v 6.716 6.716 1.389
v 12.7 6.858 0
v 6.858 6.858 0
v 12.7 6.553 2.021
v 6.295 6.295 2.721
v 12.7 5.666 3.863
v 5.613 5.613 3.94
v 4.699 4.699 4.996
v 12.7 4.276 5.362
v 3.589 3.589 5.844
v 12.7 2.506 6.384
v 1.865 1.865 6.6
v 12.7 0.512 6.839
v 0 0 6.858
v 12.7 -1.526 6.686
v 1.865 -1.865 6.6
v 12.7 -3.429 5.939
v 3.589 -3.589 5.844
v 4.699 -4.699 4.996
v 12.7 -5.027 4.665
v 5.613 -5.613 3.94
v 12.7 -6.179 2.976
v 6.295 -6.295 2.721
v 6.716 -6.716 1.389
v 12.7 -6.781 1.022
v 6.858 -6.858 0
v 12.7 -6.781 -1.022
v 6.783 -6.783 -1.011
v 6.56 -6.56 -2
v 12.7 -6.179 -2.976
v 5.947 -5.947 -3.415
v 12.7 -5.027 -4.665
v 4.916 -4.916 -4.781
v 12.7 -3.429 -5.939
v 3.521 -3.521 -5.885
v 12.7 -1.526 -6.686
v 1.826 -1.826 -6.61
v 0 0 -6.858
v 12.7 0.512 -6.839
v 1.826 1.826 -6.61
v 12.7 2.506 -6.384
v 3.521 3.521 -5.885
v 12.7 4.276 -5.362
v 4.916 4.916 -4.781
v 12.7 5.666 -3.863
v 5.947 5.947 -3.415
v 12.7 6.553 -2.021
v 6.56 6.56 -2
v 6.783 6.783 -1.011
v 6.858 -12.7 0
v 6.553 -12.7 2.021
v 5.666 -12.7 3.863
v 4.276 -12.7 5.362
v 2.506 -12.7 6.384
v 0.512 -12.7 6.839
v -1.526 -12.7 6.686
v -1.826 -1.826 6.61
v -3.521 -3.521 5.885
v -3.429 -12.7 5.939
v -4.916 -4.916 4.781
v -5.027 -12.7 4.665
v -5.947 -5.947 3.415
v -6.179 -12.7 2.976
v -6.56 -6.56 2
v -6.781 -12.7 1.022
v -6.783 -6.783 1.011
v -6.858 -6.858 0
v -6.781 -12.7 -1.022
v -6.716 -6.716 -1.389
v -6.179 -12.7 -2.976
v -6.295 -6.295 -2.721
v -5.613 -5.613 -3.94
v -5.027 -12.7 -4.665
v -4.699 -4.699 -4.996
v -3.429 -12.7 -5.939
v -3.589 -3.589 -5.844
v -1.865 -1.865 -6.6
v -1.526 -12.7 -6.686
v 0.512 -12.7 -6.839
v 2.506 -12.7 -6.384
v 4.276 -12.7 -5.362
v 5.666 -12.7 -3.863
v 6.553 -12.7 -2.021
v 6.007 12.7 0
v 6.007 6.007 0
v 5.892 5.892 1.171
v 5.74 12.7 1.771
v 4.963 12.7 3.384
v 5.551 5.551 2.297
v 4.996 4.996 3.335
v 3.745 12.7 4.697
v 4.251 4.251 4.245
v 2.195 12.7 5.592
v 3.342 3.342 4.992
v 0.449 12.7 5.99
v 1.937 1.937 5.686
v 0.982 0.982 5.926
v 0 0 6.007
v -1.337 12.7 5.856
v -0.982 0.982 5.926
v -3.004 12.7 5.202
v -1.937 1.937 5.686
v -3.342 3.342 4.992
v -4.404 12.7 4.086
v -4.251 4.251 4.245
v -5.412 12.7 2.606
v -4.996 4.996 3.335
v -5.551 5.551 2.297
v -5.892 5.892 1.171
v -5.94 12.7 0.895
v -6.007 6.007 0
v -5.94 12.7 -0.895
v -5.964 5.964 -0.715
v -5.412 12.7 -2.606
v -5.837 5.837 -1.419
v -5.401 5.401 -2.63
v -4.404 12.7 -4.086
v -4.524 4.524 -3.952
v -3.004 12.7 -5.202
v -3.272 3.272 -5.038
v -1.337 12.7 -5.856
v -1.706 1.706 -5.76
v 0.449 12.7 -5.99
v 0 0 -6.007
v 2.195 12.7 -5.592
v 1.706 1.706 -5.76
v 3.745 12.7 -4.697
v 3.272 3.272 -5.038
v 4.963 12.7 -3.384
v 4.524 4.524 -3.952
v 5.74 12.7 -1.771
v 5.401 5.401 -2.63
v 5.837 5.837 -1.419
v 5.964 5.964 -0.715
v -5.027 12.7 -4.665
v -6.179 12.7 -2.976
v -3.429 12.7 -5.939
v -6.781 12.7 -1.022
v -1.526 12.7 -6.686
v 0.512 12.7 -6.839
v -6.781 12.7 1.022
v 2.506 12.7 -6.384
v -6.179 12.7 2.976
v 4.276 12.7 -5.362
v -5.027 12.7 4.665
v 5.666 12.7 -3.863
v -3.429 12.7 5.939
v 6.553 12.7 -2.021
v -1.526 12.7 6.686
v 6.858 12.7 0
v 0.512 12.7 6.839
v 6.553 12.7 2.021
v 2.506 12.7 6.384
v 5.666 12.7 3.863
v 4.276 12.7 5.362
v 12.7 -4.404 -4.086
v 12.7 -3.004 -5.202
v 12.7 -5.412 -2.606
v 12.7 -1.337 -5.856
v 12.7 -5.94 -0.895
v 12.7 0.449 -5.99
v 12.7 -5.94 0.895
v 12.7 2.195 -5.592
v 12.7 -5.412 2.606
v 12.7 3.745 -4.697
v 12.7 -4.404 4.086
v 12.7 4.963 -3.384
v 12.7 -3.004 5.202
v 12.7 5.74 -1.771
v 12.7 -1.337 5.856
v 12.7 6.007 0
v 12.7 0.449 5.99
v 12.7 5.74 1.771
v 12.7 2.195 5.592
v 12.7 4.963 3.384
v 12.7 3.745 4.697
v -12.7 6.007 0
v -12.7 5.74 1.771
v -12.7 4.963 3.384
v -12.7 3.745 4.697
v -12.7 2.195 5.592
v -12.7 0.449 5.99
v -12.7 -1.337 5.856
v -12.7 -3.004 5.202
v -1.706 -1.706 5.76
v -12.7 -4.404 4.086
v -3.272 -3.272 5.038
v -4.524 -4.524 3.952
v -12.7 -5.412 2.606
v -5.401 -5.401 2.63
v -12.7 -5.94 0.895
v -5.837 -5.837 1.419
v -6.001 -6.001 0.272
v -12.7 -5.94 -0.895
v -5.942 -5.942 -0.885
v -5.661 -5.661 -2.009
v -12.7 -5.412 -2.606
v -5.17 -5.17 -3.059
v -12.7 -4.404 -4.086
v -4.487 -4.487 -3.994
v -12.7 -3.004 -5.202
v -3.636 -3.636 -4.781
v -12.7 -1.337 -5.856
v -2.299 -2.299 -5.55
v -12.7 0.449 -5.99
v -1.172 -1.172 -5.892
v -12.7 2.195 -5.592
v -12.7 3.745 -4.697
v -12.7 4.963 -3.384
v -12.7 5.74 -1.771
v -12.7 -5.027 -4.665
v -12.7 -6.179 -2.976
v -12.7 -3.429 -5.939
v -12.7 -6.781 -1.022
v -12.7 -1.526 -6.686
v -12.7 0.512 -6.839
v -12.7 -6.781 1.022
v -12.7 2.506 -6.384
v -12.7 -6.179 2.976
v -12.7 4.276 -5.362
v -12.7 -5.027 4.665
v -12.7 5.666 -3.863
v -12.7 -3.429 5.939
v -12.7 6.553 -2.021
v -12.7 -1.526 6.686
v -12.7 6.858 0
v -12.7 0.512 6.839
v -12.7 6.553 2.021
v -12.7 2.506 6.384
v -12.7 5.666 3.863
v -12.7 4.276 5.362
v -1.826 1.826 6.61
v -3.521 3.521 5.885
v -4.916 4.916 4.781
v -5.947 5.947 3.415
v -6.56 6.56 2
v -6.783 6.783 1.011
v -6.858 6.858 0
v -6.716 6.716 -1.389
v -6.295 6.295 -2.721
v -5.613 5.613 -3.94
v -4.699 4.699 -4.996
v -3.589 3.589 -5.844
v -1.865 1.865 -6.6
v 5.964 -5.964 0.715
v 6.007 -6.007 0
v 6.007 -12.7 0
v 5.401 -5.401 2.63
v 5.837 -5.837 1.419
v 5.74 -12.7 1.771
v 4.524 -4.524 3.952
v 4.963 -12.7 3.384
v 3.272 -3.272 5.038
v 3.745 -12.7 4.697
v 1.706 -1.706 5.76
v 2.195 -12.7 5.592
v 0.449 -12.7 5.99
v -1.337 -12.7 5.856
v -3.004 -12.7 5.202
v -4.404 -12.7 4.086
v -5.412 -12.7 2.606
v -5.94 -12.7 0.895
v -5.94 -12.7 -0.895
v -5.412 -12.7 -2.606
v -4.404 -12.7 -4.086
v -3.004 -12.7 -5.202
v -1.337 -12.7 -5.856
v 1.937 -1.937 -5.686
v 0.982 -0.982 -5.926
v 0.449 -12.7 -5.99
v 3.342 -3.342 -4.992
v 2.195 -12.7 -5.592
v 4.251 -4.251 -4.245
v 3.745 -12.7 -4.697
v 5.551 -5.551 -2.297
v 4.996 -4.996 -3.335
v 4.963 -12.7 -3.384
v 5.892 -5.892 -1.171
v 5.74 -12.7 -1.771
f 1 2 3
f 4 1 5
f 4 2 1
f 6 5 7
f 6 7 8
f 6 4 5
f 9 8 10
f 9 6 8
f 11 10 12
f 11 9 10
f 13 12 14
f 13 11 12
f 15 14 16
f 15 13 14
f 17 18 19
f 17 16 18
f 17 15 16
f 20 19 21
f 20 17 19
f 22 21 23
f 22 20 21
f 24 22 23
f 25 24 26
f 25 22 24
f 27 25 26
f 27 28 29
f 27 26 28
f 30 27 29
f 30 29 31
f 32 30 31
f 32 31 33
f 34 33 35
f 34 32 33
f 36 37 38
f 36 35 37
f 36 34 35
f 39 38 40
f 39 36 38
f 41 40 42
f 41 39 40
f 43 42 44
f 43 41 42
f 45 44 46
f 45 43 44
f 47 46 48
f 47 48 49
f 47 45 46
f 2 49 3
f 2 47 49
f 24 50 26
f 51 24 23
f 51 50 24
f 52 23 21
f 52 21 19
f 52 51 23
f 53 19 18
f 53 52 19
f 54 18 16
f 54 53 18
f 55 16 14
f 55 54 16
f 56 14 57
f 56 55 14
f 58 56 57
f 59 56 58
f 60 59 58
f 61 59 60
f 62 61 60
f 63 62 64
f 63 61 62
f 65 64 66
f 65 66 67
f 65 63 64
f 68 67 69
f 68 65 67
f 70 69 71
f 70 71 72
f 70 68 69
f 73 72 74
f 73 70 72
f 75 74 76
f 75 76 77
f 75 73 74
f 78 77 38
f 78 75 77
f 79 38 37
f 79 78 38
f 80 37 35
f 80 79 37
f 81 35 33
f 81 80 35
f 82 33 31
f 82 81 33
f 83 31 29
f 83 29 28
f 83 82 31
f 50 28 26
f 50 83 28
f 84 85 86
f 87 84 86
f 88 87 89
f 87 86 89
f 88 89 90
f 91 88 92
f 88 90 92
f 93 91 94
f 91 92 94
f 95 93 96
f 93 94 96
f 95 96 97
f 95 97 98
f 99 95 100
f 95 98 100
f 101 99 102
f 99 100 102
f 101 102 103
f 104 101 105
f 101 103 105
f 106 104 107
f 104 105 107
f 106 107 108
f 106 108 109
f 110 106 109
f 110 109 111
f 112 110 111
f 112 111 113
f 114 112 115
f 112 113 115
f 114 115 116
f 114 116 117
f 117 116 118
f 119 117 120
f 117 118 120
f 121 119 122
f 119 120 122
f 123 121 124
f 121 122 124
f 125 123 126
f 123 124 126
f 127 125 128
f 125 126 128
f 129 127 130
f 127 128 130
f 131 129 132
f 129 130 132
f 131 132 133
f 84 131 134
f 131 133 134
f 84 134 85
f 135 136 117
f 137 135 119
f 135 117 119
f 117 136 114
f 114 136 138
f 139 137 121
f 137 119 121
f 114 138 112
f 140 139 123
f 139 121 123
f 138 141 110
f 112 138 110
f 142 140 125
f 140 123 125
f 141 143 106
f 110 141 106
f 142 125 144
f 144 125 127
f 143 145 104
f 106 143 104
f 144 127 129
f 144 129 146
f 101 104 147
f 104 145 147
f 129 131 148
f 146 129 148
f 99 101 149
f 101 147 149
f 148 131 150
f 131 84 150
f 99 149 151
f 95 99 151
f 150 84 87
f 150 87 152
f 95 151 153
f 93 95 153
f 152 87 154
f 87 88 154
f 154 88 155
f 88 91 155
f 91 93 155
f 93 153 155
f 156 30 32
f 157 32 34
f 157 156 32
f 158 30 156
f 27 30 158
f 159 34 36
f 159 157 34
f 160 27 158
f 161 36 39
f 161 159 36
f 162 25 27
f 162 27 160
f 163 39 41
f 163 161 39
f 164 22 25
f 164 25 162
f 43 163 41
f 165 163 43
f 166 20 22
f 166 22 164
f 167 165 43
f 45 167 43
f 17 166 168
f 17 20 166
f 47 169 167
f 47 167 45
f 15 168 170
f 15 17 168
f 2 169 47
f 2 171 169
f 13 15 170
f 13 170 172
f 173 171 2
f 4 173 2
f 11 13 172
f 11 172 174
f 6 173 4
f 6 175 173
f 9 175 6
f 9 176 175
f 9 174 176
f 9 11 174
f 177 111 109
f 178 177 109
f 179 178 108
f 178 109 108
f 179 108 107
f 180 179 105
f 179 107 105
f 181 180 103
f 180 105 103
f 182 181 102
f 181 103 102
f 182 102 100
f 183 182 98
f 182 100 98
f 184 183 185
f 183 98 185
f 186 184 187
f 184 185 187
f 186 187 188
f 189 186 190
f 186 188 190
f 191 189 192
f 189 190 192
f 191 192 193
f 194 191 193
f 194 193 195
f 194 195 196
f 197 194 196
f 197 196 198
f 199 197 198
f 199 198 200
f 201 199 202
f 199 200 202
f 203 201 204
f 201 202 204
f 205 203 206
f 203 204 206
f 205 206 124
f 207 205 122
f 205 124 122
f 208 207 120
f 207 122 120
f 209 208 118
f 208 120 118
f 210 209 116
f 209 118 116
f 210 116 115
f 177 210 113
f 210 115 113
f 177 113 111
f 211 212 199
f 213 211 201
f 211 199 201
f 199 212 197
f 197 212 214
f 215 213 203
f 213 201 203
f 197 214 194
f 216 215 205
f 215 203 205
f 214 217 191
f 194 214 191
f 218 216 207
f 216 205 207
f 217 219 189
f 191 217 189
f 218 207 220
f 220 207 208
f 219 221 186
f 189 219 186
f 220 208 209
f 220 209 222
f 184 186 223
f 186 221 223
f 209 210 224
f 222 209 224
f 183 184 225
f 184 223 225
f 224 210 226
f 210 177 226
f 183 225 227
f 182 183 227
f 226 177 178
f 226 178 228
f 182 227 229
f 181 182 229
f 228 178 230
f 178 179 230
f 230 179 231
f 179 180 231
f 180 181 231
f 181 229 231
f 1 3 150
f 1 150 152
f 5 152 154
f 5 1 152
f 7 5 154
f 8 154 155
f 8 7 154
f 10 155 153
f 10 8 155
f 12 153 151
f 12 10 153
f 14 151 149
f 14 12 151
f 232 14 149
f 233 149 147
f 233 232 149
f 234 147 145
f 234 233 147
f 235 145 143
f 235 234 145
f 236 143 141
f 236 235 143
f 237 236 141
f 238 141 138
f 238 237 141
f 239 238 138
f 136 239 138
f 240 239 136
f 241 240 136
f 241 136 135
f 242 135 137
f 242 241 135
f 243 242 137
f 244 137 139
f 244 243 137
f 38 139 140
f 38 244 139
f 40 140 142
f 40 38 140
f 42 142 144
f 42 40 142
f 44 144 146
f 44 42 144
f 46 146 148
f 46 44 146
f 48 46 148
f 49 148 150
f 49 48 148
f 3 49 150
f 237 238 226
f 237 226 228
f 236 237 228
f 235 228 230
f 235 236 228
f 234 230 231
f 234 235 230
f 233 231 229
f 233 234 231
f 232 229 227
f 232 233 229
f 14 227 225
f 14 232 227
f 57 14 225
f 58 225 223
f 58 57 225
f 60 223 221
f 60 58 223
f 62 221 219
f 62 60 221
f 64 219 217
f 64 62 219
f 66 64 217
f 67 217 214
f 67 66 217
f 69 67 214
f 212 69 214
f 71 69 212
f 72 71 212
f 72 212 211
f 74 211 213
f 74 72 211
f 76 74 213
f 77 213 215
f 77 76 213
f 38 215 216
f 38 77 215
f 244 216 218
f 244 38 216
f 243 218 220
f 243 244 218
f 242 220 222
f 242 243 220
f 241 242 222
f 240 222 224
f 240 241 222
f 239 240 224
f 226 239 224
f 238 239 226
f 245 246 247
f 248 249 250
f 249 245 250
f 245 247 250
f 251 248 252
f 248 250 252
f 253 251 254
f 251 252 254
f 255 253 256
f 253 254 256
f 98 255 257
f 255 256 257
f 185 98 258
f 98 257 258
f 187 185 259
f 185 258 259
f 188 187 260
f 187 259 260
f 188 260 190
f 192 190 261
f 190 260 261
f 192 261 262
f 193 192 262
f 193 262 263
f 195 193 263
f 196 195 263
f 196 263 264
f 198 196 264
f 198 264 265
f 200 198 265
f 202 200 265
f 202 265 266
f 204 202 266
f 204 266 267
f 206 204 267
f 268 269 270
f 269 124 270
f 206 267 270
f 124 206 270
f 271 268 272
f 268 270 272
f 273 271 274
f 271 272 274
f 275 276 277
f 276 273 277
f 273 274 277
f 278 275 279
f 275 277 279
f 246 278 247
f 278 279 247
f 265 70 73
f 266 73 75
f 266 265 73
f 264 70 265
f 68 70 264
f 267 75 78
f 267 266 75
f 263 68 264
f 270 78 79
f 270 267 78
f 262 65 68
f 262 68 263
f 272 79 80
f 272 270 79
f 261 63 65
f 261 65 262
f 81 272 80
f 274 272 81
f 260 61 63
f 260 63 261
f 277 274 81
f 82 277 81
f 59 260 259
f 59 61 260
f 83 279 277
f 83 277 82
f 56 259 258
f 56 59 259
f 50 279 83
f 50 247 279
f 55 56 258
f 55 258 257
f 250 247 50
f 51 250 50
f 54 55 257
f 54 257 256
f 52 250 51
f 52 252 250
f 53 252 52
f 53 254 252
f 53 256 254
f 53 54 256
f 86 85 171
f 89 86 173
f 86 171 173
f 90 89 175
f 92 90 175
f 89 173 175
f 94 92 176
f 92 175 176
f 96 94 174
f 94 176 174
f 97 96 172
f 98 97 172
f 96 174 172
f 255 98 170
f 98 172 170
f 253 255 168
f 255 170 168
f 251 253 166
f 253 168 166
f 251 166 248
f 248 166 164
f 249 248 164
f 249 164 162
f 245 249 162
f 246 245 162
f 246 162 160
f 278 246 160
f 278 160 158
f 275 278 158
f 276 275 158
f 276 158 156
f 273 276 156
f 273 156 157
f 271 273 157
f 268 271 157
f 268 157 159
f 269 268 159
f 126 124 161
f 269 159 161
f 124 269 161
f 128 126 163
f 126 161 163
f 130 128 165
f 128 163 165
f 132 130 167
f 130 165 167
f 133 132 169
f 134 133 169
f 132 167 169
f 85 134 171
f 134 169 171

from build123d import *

# Parameters (mm, degrees)
F0_R     = 5.1562
F0_R_2   = 6.858
F1_DEPTH = 12.7
F2_R     = 5.1562
F2_R_2   = 6.858
F3_DEPTH = 12.7
F4_R     = 6.0071
F5_DEPTH = 12.7
F6_R     = 6.0071
F7_DEPTH = 12.7


with BuildPart() as f1:
    # F0 (on Front) → F1 (new body, symmetric)
    with BuildSketch(Plane.XZ):
        Circle(F0_R)
        Circle(F0_R_2)
        Circle(F0_R, mode=Mode.SUBTRACT)
    extrude(amount=F1_DEPTH, both=True)

    # F2 (on Right) → F3 (join, symmetric)
    with BuildSketch(Plane.YZ):
        Circle(F2_R)
        Circle(F2_R_2)
        Circle(F2_R, mode=Mode.SUBTRACT)
    extrude(amount=F3_DEPTH, both=True)

    # F4 (on Right) → F5 (cut, symmetric)
    with BuildSketch(Plane.YZ):
        Circle(F4_R)
    extrude(amount=F5_DEPTH, both=True, mode=Mode.SUBTRACT)

    # F6 (on Front) → F7 (cut, symmetric)
    with BuildSketch(Plane.XZ):
        Circle(F6_R)
    extrude(amount=F7_DEPTH, both=True, mode=Mode.SUBTRACT)


solid = f1.part
